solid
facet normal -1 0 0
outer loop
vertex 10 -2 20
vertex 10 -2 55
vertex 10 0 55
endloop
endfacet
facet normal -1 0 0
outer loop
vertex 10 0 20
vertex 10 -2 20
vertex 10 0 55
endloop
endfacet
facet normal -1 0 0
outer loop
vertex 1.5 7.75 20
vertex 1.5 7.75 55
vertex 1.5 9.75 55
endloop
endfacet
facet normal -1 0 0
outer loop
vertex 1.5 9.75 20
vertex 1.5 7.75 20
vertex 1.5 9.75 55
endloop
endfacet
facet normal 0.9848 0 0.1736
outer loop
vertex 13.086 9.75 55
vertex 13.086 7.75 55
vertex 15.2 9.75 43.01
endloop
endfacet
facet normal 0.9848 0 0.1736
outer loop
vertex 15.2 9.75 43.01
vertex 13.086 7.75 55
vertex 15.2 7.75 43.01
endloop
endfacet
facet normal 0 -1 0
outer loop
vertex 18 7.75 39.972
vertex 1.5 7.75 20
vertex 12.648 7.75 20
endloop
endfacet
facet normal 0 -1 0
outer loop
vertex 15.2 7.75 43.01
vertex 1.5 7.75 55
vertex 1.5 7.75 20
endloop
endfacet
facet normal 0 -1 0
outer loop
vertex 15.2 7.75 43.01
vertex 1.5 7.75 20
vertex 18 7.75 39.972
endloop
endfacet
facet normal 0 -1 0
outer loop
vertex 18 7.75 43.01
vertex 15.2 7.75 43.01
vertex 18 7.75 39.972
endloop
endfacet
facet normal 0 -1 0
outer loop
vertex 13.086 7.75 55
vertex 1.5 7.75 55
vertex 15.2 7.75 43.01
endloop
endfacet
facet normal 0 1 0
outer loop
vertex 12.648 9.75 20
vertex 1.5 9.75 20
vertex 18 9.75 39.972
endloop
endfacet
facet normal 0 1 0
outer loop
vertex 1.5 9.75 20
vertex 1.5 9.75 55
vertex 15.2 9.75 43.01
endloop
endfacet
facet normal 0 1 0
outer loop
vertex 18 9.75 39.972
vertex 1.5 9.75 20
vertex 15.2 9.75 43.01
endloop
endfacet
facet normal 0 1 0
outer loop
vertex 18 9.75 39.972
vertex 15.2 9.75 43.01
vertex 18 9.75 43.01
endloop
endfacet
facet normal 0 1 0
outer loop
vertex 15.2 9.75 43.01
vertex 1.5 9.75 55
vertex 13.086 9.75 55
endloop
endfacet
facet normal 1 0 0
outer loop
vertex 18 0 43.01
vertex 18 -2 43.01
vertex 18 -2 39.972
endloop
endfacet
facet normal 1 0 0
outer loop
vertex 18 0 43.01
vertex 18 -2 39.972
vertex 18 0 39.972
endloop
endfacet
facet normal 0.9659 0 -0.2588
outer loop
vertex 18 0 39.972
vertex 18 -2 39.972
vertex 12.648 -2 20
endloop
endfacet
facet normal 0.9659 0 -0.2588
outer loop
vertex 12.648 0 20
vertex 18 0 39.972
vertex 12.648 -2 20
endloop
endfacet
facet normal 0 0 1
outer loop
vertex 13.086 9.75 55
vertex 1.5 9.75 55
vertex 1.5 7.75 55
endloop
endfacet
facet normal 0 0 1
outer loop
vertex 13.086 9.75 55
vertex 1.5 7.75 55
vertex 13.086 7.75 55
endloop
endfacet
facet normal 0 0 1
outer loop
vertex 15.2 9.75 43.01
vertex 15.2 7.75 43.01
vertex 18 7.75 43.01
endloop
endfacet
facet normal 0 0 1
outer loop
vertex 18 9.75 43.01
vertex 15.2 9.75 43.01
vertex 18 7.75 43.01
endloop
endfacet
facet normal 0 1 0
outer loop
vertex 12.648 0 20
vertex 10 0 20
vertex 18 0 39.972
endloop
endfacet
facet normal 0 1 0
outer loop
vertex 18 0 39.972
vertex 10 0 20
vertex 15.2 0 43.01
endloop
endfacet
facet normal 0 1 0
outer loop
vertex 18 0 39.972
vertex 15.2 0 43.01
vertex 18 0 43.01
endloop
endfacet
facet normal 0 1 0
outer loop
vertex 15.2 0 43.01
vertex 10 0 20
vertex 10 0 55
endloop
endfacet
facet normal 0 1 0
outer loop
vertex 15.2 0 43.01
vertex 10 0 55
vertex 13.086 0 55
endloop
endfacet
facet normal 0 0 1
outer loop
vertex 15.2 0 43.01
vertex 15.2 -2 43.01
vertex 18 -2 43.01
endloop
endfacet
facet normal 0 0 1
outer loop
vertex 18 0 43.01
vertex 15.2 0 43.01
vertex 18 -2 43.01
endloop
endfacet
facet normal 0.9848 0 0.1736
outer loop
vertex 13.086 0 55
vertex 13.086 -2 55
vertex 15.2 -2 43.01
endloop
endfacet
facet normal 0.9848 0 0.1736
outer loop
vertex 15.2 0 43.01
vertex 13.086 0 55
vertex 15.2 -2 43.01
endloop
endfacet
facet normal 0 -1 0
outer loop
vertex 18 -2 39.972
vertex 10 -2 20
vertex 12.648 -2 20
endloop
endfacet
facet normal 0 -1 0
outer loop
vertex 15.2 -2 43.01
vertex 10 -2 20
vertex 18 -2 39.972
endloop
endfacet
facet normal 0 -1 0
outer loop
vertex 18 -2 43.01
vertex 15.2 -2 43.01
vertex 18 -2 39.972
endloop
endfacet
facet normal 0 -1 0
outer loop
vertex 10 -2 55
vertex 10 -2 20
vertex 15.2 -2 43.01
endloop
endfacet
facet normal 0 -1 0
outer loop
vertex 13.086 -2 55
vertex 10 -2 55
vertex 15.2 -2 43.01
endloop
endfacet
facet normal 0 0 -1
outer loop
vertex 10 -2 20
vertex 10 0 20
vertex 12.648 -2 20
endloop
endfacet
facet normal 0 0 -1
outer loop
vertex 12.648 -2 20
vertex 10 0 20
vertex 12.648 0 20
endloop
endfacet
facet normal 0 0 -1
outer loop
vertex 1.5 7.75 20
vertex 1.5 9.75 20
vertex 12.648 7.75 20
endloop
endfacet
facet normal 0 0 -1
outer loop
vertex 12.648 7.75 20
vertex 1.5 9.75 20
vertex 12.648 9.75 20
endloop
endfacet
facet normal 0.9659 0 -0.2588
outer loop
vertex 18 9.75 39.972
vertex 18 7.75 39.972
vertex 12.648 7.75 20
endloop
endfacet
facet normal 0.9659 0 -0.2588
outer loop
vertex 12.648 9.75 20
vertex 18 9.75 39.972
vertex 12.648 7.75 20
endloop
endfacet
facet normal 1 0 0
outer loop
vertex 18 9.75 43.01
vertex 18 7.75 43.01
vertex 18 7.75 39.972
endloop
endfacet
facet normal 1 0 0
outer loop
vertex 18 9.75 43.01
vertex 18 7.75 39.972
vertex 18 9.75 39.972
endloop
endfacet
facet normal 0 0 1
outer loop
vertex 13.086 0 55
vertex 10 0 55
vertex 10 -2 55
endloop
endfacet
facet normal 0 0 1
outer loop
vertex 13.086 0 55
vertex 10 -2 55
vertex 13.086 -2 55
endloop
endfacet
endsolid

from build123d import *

# Parameters (mm, degrees)
EXTRUDE021_DEPTH      = 20
EXTRUDE019_DEPTH      = 14
SKETCH022_W           = 16.5
SKETCH022_H           = 2
SKETCH022_W_2         = 8
EXTRUDE018_DEPTH      = 20
EXTRUDE018_DEPTH_BACK = 15


with BuildPart() as extrude021:
    # Sketch025 → Extrude021 (new body, symmetric)
    with BuildSketch(Plane.XZ):
        Polygon((12.911408, 55.989248), (15.2, 43.01), (22, 43.01), (22, 55.989248), align=None)
    extrude(amount=EXTRUDE021_DEPTH, both=True)


with BuildPart() as compound005:
    # Sketch023 → Extrude019 (new body, symmetric)
    with BuildSketch(Plane.XZ):
        Polygon((19.079246, 44), (12, 17.579893), (23, 17.579893), (23, 44), align=None)
    extrude(amount=EXTRUDE019_DEPTH, both=True)

    # Compound005: union Extrude021
    add(extrude021.part)


with BuildPart() as cut002:
    # Sketch022 → Extrude018 (new body, two sides)
    with BuildSketch(Plane.XY.offset(35)) as extrude018_sk:
        with Locations((9.75, 8.75)):
            Rectangle(SKETCH022_W, SKETCH022_H)
        with Locations((14, -1)):
            Rectangle(SKETCH022_W_2, SKETCH022_H)
    extrude(amount=EXTRUDE018_DEPTH)
    extrude(extrude018_sk.sketch, amount=-EXTRUDE018_DEPTH_BACK)

    # Cut002: cut Compound005
    add(compound005.part, mode=Mode.SUBTRACT)


solid = cut002.part
